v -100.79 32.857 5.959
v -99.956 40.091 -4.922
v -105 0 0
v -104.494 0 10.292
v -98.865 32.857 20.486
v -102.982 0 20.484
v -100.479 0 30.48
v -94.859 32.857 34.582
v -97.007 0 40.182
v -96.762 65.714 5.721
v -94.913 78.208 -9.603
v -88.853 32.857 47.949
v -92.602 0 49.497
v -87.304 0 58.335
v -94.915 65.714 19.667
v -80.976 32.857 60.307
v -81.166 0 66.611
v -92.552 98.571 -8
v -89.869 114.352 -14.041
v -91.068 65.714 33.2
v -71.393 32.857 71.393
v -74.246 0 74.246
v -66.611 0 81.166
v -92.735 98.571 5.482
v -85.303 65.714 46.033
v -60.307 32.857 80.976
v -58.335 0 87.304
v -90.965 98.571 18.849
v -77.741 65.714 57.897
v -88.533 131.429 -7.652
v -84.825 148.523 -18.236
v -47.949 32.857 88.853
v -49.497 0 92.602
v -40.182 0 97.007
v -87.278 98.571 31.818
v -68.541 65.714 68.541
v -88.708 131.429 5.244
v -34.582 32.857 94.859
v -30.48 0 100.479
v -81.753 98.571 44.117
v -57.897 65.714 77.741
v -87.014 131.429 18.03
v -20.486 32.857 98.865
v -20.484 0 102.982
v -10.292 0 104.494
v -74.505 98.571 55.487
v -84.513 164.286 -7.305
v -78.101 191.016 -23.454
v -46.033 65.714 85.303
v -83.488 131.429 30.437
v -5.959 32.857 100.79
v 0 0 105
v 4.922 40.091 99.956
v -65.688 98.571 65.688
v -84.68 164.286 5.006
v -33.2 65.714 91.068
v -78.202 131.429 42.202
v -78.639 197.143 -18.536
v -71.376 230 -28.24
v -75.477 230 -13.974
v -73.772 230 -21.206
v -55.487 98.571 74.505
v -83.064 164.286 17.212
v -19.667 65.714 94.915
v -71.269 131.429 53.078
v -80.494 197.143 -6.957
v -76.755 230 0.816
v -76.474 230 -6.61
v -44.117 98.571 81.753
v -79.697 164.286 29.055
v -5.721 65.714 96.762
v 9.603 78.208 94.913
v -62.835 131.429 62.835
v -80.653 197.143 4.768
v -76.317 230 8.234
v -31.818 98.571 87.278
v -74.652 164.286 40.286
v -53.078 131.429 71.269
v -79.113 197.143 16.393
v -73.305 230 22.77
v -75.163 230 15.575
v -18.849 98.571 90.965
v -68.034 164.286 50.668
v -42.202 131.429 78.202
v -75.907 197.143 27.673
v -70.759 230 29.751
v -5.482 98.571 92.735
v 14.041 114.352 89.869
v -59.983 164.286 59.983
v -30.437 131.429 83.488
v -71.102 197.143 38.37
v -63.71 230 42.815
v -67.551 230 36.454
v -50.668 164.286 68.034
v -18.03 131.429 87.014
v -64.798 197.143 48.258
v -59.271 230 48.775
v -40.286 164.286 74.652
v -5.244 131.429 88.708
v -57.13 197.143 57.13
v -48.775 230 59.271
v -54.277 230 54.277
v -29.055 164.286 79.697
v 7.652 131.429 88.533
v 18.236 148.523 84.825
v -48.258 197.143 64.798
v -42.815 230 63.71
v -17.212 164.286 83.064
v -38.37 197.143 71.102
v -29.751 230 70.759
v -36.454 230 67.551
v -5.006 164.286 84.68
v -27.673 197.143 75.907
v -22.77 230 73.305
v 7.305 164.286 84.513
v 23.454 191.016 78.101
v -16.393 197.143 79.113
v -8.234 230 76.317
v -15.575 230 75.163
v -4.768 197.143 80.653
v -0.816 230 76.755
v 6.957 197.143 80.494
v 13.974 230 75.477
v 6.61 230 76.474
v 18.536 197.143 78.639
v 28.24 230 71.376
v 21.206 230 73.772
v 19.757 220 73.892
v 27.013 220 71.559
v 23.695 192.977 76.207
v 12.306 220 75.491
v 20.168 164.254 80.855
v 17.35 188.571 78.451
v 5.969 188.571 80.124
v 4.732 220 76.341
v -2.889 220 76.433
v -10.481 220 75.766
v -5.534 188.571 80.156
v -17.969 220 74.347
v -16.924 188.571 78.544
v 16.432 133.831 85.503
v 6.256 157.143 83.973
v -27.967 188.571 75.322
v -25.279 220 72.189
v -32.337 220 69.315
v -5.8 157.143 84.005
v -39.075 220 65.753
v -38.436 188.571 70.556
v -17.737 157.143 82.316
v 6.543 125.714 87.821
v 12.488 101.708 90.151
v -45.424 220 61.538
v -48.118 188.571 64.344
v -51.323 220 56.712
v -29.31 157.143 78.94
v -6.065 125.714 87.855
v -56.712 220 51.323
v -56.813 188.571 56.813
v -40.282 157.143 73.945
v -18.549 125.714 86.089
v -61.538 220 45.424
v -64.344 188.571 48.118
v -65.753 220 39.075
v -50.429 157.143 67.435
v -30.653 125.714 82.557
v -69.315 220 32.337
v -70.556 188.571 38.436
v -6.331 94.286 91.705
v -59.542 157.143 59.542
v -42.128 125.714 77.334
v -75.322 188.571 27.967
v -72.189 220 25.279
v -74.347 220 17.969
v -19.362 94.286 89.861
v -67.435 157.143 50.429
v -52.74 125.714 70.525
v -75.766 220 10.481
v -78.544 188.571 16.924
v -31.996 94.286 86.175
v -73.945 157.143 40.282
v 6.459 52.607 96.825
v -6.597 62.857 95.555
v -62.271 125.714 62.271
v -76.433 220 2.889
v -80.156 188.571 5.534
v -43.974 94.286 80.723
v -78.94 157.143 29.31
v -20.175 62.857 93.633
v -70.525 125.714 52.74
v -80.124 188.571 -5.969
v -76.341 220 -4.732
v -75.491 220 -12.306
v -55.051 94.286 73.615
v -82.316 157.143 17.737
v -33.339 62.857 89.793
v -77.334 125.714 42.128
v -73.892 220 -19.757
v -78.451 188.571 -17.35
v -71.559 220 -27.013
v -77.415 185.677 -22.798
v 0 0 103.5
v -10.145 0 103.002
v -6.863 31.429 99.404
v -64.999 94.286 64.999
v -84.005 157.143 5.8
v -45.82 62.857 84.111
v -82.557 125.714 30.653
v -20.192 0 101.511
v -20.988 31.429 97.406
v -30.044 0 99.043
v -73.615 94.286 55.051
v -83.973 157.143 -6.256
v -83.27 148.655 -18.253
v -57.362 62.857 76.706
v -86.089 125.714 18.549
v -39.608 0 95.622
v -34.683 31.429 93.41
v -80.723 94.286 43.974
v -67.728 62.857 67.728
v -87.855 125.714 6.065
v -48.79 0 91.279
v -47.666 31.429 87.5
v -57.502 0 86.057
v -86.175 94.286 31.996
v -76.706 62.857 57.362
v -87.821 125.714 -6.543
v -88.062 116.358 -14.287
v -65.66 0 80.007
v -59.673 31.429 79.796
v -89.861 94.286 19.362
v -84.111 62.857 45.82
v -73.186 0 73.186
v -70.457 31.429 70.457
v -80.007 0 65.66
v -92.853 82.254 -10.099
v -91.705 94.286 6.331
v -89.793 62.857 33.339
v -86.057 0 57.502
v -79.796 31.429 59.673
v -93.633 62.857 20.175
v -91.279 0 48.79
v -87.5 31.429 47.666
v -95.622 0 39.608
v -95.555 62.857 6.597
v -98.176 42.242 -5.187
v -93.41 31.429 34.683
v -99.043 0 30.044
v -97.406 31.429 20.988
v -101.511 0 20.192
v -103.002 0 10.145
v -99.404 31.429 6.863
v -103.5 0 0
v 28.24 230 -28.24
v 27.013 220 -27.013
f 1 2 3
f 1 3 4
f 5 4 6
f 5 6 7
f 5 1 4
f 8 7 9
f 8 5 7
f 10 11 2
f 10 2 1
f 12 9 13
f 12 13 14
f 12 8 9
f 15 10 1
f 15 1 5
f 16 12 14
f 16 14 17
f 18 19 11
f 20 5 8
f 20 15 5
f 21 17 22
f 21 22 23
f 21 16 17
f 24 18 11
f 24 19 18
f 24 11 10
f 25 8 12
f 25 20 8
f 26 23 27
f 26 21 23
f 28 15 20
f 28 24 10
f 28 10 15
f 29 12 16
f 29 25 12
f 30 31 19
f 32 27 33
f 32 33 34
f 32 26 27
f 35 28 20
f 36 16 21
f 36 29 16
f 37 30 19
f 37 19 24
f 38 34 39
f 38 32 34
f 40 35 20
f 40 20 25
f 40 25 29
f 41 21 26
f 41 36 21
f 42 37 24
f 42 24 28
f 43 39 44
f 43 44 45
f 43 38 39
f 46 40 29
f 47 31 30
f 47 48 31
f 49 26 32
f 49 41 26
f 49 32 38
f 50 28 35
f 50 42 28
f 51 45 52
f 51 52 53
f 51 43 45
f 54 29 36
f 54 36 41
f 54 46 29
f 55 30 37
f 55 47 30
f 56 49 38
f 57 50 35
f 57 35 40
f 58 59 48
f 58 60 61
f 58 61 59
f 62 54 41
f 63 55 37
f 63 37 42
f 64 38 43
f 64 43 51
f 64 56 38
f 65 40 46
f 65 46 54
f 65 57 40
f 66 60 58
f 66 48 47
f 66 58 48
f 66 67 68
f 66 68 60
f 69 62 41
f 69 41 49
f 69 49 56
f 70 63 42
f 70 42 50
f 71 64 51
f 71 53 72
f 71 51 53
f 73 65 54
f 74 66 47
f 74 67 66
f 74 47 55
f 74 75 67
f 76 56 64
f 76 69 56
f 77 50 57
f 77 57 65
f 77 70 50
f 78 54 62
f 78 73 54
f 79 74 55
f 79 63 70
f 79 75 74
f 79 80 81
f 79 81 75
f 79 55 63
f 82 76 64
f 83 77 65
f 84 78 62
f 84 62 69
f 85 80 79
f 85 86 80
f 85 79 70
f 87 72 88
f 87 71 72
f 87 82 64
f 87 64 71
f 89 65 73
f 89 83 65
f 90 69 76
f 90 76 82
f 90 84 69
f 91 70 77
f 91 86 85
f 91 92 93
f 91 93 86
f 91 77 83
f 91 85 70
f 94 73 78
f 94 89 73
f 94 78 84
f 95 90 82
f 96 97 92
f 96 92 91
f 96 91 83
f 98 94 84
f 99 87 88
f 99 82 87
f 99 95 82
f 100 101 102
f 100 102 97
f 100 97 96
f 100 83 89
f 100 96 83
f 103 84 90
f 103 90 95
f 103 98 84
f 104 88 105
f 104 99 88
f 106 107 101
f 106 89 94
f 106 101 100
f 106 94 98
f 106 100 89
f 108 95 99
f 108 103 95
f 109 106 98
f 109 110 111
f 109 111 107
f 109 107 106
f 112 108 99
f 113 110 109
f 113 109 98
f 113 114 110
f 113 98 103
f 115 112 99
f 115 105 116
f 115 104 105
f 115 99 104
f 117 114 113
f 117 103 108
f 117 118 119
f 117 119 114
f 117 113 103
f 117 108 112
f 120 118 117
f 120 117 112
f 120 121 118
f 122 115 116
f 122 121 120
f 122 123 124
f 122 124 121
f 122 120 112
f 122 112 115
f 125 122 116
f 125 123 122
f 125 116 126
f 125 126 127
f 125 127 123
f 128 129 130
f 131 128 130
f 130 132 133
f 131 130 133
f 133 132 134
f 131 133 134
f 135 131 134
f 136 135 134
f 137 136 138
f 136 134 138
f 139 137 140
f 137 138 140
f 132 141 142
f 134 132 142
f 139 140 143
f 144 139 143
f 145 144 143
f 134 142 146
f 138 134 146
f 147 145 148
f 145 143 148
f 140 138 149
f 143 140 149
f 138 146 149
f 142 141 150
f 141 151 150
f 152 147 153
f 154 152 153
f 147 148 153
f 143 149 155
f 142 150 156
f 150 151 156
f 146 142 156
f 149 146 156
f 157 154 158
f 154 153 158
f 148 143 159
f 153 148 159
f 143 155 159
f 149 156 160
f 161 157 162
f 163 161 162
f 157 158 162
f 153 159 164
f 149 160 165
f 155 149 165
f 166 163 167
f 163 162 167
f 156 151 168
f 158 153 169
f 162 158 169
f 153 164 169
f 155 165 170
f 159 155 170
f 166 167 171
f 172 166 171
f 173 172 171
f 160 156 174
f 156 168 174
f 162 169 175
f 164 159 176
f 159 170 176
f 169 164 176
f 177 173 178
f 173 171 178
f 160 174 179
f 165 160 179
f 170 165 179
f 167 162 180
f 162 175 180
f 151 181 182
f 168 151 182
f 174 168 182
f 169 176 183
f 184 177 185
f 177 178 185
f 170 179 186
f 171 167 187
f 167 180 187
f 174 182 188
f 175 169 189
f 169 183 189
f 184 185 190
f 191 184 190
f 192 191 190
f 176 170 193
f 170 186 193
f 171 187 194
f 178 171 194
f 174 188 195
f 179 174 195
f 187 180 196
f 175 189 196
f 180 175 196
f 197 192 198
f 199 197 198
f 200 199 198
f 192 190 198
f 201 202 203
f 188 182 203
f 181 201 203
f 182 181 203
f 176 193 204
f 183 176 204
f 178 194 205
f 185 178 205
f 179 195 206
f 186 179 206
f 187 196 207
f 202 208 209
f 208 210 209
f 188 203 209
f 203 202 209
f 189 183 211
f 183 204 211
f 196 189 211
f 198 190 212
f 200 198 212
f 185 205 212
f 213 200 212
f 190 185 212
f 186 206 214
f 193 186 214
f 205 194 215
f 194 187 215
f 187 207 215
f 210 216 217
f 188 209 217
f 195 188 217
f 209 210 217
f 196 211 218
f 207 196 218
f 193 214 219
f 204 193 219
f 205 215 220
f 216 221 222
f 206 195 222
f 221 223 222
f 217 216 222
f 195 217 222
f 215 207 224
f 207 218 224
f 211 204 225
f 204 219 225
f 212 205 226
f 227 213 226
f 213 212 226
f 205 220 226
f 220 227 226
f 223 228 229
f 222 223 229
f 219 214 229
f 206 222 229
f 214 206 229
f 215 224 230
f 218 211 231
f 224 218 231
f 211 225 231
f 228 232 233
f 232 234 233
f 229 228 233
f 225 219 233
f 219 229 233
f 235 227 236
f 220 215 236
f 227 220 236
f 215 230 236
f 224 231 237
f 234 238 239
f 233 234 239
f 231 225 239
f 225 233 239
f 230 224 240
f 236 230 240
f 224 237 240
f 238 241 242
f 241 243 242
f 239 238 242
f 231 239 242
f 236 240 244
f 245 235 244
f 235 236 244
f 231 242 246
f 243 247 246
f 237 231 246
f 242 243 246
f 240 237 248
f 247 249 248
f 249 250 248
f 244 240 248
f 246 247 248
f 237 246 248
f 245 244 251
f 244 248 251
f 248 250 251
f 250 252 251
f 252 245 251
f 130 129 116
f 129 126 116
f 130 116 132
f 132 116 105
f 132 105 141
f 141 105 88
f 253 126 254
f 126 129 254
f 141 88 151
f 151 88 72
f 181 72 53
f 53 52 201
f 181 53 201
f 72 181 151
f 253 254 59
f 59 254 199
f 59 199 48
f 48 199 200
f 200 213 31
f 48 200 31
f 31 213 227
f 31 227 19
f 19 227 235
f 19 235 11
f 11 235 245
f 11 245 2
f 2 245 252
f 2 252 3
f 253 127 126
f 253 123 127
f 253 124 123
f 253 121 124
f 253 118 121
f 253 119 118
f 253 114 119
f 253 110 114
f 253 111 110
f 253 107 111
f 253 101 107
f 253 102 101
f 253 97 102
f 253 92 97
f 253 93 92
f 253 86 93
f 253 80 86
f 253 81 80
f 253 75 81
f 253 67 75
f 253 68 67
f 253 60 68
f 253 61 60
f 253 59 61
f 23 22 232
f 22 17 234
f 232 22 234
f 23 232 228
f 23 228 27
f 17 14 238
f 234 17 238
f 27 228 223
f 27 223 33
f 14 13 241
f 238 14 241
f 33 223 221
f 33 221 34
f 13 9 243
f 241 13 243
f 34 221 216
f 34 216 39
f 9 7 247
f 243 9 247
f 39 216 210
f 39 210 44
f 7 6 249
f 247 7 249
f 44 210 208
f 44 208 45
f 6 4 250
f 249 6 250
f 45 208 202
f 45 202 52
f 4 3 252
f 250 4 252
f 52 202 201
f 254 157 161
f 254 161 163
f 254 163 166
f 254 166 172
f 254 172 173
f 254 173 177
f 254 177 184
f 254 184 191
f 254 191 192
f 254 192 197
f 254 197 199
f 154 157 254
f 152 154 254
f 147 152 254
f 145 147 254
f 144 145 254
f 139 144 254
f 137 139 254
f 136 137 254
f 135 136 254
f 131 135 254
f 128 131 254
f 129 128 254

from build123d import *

# Parameters (mm, degrees)
SKETCH2_R           = 105
BOSS_EXTRUDE1_DEPTH = 230
BOSS_EXTRUDE1_TAPER = 7
SKETCH3_R           = 103.5
CUT_EXTRUDE1_DEPTH  = 220
CUT_EXTRUDE1_DRAFT  = -7
CUT_EXTRUDE2_DEPTH  = 230
CUT_EXTRUDE2_DRAFT  = -7


with BuildPart() as part:
    # Sketch2 → Boss-Extrude1 (new body)
    with BuildSketch(Plane(origin=(0, 0, 0), x_dir=(1, 0, 0), z_dir=(0, 1, 0))):
        Circle(SKETCH2_R)
    extrude(amount=BOSS_EXTRUDE1_DEPTH, taper=BOSS_EXTRUDE1_TAPER)


with BuildPart() as cut_extrude1_tool:
    # Sketch3 → Cut-Extrude1 (with draft: the straight prism first)
    with BuildSketch(Plane.XZ):
        Circle(SKETCH3_R)
    extrude(amount=-CUT_EXTRUDE1_DEPTH)
    # Cut-Extrude1: the draft: its side faces are tilted about the plane it starts from
    cut_extrude1_sides = [cut_extrude1_tool.faces().sort_by_distance(p)[0] for p in [
        (-103.5, 110, 0),
    ]]
    draft(cut_extrude1_sides, Plane.XZ, CUT_EXTRUDE1_DRAFT)


with BuildPart() as part_1:
    add(part.part)

    # Cut-Extrude1: cut by cut_extrude1_tool
    add(cut_extrude1_tool.part, mode=Mode.SUBTRACT)


with BuildPart() as cut_extrude2_tool:
    # Sketch4 → Cut-Extrude2 (with draft: the straight prism first)
    with BuildSketch(Plane.XZ):
        with BuildLine():
            ThreePointArc((-105, 0), (74.246212025, -74.246212025), (0, 105))
            Line((0, 105), (0, 0))
            Line((0, 0), (-105, 0))
        make_face()
    extrude(amount=-CUT_EXTRUDE2_DEPTH)
    # Cut-Extrude2: the draft: its side faces are tilted about the plane it starts from
    cut_extrude2_sides = [cut_extrude2_tool.faces().sort_by_distance(p)[0] for p in [
        (74.246212025, 115, -74.246212025),
        (0, 115, 52.5),
        (-52.5, 115, 0),
    ]]
    draft(cut_extrude2_sides, Plane.XZ, CUT_EXTRUDE2_DRAFT)


with BuildPart() as part_2:
    add(part_1.part)

    # Cut-Extrude2: cut by cut_extrude2_tool
    add(cut_extrude2_tool.part, mode=Mode.SUBTRACT)


solid = part_2.part
